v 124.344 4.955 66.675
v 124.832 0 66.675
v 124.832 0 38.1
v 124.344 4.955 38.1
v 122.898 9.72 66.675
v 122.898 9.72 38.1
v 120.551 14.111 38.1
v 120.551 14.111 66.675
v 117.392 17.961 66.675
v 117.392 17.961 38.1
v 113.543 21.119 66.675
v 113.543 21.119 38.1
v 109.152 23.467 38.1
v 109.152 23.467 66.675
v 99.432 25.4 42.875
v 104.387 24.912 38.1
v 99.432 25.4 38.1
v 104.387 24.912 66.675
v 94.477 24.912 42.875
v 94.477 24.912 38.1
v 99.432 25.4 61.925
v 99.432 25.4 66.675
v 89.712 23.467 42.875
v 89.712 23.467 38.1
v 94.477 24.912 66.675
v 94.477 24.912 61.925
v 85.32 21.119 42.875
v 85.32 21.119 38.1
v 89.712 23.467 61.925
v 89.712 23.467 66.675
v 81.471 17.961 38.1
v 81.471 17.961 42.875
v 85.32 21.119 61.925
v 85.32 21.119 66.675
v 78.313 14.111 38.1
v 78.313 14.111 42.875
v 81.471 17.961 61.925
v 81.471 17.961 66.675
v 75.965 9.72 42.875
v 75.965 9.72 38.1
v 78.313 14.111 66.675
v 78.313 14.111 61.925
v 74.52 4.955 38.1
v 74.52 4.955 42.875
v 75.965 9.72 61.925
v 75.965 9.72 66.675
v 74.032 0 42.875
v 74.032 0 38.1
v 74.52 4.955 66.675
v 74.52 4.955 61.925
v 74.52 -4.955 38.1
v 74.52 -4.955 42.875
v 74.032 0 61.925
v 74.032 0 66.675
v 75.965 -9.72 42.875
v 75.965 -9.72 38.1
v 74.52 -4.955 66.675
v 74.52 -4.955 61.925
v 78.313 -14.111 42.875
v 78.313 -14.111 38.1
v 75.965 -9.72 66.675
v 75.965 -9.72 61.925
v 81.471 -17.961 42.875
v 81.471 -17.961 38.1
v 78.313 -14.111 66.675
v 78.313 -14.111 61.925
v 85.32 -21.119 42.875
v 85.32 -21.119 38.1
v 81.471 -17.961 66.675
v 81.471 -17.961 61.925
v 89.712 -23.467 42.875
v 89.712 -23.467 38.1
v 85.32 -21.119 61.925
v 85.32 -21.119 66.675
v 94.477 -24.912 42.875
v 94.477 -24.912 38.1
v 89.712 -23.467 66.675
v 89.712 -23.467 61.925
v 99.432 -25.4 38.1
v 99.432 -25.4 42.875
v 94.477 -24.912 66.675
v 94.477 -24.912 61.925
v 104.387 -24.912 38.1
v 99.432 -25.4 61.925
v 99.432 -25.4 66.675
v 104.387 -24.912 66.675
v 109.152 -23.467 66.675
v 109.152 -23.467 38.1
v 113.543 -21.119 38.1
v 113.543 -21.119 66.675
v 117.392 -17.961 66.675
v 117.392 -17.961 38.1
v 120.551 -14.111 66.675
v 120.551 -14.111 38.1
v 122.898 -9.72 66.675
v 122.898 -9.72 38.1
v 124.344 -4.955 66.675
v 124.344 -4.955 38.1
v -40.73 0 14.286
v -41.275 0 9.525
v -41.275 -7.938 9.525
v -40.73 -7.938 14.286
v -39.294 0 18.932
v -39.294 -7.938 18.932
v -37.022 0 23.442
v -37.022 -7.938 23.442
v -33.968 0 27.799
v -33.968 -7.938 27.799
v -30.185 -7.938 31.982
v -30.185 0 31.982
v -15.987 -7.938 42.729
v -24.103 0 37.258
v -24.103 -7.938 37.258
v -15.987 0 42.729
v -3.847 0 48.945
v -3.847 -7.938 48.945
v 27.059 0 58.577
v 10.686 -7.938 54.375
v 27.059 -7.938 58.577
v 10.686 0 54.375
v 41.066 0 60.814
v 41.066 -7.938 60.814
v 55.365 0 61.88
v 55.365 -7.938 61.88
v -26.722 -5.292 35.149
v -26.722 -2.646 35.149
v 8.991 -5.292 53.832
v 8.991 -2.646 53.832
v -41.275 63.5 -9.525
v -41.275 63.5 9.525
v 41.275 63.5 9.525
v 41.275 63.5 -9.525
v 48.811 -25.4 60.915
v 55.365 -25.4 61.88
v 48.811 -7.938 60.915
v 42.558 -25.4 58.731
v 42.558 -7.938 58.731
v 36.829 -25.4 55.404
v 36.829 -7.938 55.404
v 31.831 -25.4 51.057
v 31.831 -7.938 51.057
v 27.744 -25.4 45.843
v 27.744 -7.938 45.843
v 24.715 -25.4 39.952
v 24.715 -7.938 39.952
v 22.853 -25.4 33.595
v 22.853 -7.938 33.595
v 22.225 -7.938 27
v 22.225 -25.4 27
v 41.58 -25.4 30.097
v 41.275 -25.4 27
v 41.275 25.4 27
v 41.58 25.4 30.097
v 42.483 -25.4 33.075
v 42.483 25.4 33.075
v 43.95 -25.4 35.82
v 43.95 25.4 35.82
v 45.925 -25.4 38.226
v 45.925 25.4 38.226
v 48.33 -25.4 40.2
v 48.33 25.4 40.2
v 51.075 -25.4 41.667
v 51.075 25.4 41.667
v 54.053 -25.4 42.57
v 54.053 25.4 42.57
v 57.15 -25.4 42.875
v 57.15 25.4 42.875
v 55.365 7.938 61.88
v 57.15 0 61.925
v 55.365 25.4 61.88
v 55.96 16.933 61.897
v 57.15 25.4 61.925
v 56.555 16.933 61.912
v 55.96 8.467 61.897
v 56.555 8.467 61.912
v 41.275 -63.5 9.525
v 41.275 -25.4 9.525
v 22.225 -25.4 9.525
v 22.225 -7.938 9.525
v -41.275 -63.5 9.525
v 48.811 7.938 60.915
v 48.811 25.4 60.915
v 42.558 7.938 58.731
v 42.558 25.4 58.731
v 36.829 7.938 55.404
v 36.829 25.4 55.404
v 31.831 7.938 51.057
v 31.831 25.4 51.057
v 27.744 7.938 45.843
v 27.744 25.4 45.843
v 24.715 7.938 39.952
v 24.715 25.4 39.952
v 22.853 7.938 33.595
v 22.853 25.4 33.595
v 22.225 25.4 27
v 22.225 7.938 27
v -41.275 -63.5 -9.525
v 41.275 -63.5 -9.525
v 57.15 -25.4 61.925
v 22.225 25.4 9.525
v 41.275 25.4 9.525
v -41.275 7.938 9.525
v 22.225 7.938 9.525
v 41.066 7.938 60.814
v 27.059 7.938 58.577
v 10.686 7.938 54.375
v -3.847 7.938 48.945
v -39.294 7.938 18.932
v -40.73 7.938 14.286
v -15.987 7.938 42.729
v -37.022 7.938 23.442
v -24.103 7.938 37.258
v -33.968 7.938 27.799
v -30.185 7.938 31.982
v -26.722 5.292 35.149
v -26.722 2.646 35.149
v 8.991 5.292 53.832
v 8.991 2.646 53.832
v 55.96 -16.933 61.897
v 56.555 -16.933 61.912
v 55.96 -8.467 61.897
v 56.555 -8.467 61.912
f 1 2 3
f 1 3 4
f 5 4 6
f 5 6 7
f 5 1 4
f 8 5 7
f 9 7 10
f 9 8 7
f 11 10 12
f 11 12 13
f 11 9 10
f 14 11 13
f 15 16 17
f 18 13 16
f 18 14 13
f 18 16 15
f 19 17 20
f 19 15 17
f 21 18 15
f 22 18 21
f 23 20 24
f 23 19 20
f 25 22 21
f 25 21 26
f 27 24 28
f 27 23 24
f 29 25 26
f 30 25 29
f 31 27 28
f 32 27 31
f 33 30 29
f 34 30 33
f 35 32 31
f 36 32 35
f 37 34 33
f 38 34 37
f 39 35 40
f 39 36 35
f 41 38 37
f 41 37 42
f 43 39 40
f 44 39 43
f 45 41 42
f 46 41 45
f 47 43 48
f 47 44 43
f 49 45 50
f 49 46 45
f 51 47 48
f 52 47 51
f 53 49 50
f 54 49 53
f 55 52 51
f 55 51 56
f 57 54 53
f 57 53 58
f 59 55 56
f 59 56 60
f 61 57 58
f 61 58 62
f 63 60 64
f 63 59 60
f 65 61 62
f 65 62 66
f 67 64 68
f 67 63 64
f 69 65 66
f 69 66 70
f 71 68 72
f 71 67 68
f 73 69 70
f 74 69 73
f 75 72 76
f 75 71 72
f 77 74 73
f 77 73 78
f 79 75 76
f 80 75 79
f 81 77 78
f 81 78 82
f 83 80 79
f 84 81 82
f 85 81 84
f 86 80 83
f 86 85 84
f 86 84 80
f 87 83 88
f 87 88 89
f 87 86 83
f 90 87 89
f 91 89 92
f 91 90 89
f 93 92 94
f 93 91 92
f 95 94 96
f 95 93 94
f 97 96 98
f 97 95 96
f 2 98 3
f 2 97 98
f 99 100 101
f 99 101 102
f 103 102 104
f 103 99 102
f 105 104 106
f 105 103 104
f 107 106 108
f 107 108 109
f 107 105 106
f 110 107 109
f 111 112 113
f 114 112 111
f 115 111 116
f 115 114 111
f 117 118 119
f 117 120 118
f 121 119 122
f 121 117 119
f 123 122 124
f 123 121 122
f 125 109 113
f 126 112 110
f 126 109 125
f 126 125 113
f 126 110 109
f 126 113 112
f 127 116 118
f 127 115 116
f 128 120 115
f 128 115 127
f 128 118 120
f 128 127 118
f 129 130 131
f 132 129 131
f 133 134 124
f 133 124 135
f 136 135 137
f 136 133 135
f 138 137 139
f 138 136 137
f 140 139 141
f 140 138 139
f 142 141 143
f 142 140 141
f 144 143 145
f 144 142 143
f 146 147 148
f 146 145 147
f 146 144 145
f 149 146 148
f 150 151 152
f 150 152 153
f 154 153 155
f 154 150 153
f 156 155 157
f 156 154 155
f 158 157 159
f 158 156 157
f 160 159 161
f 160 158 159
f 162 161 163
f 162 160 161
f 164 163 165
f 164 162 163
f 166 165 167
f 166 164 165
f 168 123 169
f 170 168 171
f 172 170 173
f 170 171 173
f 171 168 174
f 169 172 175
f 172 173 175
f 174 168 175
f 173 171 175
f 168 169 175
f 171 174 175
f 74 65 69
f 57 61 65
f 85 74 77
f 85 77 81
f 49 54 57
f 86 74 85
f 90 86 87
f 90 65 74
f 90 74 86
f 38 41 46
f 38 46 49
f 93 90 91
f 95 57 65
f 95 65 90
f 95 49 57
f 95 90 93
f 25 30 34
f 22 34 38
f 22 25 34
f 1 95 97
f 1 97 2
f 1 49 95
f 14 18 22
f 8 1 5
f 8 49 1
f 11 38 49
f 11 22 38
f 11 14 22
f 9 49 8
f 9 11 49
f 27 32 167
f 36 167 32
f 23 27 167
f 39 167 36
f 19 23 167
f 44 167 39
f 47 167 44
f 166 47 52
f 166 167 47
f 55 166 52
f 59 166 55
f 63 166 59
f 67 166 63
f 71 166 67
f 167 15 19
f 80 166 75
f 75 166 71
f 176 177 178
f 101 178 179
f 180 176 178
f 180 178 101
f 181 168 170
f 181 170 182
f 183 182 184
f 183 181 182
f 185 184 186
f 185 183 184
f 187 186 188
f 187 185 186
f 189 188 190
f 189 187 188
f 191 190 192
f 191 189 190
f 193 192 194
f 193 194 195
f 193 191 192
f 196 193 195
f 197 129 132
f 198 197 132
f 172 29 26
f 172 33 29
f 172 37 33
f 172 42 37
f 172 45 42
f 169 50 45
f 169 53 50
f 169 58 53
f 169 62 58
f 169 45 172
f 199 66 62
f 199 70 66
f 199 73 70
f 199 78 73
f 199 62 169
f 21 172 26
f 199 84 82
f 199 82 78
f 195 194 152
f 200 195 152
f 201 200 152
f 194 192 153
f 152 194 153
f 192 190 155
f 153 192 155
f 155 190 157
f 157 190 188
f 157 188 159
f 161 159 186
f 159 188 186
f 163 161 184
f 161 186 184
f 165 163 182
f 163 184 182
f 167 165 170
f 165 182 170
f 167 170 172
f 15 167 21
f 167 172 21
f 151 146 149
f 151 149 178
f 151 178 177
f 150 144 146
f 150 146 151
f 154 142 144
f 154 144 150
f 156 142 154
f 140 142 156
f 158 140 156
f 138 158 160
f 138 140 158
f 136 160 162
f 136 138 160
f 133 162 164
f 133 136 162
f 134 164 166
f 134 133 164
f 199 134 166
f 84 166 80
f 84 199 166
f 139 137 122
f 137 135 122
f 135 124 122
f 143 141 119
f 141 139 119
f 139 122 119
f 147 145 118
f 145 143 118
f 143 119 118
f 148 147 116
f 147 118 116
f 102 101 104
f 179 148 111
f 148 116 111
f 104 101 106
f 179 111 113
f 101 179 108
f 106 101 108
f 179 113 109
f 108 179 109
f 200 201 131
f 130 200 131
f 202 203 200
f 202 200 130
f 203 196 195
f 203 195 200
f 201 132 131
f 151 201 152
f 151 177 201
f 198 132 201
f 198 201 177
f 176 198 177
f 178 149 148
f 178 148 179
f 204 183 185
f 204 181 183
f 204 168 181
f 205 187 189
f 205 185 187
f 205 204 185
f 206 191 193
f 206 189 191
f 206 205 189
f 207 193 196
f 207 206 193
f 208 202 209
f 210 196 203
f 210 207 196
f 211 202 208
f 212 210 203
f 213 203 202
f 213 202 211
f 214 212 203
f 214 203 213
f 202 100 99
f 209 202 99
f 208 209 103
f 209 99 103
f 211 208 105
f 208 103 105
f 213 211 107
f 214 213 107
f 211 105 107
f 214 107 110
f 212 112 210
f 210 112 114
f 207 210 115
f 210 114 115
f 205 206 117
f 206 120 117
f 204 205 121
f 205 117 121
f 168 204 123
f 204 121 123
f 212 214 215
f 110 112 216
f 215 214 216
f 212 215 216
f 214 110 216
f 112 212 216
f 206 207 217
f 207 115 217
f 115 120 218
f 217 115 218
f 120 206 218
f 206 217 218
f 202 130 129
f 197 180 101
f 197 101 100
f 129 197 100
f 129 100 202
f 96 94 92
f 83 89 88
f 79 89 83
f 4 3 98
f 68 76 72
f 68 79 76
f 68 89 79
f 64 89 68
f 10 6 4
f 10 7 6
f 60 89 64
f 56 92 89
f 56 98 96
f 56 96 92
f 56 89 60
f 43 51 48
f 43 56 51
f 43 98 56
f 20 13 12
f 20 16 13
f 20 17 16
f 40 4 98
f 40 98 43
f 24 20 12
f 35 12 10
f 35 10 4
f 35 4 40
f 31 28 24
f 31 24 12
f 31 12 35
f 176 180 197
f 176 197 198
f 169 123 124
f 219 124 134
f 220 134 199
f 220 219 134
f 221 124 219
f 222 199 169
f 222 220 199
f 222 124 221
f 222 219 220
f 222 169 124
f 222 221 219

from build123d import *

# Parameters (mm, degrees)
F1_DEPTH = 63.5
F0_W     = 25.4
F0_H     = 19.05
F2_DEPTH = 25.4
F3_DEPTH = 7.9375


with BuildPart() as f1:
    # F0 (on Front) → F1 (new body, symmetric)
    with BuildSketch(Plane.XZ):
        Polygon((22.225, 9.525), (-41.275, 9.525), (-41.275, -9.525), (41.275, -9.525), (41.275, 9.525), align=None)
    extrude(amount=F1_DEPTH, both=True)

    # F0 (on Front) → F2 (join, symmetric)
    with BuildSketch(Plane.XZ):
        with BuildLine():
            Line((22.225, 27.0002), (22.225, 9.525))
            Line((22.225, 9.525), (41.275, 9.525))
            Line((41.275, 9.525), (41.275, 27.0002))
            ThreePointArc((41.275, 27.0002), (45.92468, 38.22552), (57.15, 42.8752))
            Line((57.15, 42.8752), (74.031852, 42.8752))
            Line((74.031852, 42.8752), (74.031852, 61.9252))
            Line((74.031852, 61.9252), (57.15, 61.9252))
            add(Edge.make_bspline(
                [(55.365015, 61.879556), (55.960003, 61.898055), (56.555027, 61.913281), (57.15, 61.9252)],
                knots=[110.145036, 110.145036, 110.145036, 110.145036, 111.504536, 111.504536, 111.504536, 111.504536], degree=3))
            ThreePointArc((55.365015, 61.879556), (31.831072, 51.05654), (22.225, 27.0002))
        make_face()
        with Locations((86.731852, 52.4002)):
            Rectangle(F0_W, F0_H)
    extrude(amount=F2_DEPTH, both=True)

    # F0 (on Front) → F3 (join, symmetric)
    with BuildSketch(Plane.XZ):
        with BuildLine():
            add(Edge.make_bspline(
                [(-41.275, 9.525), (-40.801804, 37.387647), (7.159855, 60.38073), (55.365015, 61.879556)],
                knots=[0, 0, 0, 0, 110.145036, 110.145036, 110.145036, 110.145036], degree=3))
            Line((-41.275, 9.525), (22.225, 9.525))
            Line((22.225, 9.525), (22.225, 27.0002))
            ThreePointArc((22.225, 27.0002), (31.831072, 51.05654), (55.365015, 61.879556))
        make_face()
    extrude(amount=F3_DEPTH, both=True)

    # F0 (on Front) → F4 (revolve)
    with BuildSketch(Plane.XZ):
        Polygon((99.431852, 66.675), (99.431852, 61.9252), (99.431852, 42.8752), (99.431852, 38.1), (124.831852, 38.1), (124.831852, 66.675), align=None)
    revolve(axis=Axis((99.431852, 0, 52.3875), (0, 0, 1)))


solid = f1.part
